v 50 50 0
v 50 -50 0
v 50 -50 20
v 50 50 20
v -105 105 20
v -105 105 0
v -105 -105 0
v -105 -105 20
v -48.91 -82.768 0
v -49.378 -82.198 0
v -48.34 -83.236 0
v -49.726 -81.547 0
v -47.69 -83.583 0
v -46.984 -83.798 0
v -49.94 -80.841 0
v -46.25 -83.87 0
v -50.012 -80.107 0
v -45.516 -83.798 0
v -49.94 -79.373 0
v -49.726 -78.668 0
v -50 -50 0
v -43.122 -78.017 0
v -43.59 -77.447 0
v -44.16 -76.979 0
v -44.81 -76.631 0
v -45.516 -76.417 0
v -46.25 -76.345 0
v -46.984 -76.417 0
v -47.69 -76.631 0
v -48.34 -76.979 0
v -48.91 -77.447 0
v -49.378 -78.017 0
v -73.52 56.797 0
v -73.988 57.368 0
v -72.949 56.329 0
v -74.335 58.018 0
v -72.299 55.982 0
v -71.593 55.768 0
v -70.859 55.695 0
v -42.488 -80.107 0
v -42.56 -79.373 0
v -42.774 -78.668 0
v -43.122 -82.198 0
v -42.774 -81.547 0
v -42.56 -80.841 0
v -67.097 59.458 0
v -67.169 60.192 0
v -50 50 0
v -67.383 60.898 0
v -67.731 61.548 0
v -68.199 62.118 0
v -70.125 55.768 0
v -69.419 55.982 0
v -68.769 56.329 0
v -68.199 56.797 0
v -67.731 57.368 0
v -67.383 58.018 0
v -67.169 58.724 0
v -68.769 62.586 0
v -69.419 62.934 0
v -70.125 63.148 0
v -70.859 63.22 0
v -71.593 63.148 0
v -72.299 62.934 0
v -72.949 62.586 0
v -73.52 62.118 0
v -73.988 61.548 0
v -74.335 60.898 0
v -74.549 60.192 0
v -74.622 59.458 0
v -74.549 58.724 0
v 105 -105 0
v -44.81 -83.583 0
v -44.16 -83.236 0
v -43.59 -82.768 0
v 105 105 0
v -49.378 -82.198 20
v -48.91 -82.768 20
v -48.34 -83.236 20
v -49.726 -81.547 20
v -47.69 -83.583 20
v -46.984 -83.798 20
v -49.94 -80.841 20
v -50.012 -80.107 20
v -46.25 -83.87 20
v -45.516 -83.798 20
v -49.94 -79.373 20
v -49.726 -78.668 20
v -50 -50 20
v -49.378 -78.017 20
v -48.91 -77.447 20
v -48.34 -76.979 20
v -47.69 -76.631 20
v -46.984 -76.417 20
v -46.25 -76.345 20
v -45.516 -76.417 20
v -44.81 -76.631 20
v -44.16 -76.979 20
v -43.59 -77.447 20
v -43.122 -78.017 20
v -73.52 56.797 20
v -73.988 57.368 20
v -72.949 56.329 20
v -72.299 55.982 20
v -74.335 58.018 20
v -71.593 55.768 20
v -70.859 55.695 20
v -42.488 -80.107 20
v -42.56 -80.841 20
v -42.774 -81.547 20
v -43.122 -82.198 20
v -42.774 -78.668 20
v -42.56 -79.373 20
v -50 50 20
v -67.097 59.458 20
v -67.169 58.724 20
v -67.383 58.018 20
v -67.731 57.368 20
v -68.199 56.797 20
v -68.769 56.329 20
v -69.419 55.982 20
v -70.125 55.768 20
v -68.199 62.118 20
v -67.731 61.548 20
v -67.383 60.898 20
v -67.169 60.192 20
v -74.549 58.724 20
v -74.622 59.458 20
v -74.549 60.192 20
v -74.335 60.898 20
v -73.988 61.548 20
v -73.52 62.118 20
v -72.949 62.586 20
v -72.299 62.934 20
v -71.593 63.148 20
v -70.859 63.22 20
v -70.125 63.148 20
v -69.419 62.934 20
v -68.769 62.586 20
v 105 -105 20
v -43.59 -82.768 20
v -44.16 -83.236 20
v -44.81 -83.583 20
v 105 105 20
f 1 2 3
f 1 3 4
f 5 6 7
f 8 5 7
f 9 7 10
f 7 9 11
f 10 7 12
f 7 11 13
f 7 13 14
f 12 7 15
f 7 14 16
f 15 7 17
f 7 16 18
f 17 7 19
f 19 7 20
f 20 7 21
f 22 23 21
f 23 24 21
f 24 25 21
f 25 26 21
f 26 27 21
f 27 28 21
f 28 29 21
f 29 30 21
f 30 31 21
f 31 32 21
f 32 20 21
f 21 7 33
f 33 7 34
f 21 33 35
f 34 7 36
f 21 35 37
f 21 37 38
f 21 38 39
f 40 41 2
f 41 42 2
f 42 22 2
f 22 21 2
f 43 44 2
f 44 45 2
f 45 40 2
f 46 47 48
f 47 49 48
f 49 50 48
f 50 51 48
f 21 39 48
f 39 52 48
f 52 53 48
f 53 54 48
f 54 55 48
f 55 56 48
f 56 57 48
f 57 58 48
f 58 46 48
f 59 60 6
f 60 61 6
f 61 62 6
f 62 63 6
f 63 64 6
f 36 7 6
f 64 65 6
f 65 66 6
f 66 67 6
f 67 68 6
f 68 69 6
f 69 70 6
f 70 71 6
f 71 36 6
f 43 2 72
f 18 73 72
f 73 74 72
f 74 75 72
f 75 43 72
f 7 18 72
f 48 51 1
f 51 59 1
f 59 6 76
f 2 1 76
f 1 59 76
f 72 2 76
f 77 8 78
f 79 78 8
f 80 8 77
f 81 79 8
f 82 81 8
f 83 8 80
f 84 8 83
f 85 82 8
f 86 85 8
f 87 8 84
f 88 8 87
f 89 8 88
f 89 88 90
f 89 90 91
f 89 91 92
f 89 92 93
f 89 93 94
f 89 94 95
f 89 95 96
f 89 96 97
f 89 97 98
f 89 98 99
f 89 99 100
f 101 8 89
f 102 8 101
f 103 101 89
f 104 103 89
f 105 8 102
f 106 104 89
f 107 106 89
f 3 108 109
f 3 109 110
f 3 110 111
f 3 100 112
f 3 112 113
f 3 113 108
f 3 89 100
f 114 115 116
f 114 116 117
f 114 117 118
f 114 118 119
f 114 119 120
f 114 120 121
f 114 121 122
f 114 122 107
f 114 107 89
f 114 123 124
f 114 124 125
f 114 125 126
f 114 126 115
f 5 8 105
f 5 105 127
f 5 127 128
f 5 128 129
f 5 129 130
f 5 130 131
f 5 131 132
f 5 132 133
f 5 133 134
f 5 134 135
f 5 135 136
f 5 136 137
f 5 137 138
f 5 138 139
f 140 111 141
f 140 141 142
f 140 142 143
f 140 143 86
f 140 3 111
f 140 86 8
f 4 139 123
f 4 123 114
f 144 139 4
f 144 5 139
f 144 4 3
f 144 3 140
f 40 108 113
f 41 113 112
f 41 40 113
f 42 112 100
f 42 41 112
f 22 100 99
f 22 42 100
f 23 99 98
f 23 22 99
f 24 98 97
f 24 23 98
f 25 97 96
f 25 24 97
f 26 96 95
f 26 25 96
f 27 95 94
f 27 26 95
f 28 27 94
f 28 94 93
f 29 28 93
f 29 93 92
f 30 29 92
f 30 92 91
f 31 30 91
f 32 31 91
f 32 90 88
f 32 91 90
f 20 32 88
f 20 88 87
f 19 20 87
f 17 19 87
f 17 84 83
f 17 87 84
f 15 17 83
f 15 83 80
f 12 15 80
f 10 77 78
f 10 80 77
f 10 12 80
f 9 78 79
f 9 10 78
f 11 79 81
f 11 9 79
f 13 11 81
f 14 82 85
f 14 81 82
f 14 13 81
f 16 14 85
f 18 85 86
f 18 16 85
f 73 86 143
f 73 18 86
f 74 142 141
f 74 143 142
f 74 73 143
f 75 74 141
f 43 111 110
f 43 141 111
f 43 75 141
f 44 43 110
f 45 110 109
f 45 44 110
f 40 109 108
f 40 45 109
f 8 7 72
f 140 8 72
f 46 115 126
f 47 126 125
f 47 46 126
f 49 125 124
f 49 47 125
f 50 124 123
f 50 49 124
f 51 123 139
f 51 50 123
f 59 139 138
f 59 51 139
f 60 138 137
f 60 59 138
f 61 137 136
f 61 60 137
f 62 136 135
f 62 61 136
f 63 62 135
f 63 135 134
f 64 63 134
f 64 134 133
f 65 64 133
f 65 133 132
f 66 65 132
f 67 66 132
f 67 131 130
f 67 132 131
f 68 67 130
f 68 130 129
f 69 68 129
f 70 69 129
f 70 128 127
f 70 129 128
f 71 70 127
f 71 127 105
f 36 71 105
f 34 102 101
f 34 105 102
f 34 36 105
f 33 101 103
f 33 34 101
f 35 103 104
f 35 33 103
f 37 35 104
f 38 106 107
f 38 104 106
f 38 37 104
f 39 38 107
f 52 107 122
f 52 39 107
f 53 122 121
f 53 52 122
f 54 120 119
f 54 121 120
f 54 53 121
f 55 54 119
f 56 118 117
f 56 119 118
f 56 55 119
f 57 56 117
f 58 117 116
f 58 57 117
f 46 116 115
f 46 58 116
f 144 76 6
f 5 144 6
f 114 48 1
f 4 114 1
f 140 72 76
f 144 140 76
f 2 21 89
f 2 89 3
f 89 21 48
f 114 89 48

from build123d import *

# Parameters (mm, degrees)
F0_W     = 100
F0_H     = 100
F1_DEPTH = 20
F2_R     = 3.7625
F3_DEPTH = 25


with BuildPart() as f1:
    # F0 (on Top) → F1 (new body)
    with BuildSketch(Plane.XY):
        with BuildLine():
            ThreePointArc((46.9041575982, 105), (81.3172798365, 81.3172798365), (105, 46.9041575982))
            Line((105, 46.9041575982), (105, 105))
            Line((105, 105), (46.9041575982, 105))
        make_face()
        with BuildLine():
            ThreePointArc((-105, 46.9041575982), (-81.3172798365, 81.3172798365), (-46.9041575982, 105))
            Line((-46.9041575982, 105), (-105, 105))
            Line((-105, 105), (-105, 46.9041575982))
        make_face()
        with BuildLine():
            Line((-105, -105), (-46.9041575982, -105))
            ThreePointArc((-46.9041575982, -105), (-81.3172798365, -81.3172798365), (-105, -46.9041575982))
            Line((-105, -46.9041575982), (-105, -105))
        make_face()
        with BuildLine():
            Line((105, -105), (105, -46.9041575982))
            ThreePointArc((105, -46.9041575982), (81.3172798365, -81.3172798365), (46.9041575982, -105))
            Line((46.9041575982, -105), (105, -105))
        make_face()
        with BuildLine():
            Line((105, -46.9041575982), (105, 46.9041575982))
            ThreePointArc((105, 46.9041575982), (81.3172798365, 81.3172798365), (46.9041575982, 105))
            Line((46.9041575982, 105), (-46.9041575982, 105))
            ThreePointArc((-46.9041575982, 105), (-81.3172798365, 81.3172798365), (-105, 46.9041575982))
            Line((-105, 46.9041575982), (-105, -46.9041575982))
            ThreePointArc((-105, -46.9041575982), (-81.3172798365, -81.3172798365), (-46.9041575982, -105))
            Line((-46.9041575982, -105), (46.9041575982, -105))
            ThreePointArc((46.9041575982, -105), (81.3172798365, -81.3172798365), (105, -46.9041575982))
        make_face()
        Rectangle(F0_W, F0_H, mode=Mode.SUBTRACT)
    extrude(amount=F1_DEPTH)

    # F2 (on Top) → F3 (cut)
    with BuildSketch(Plane.XY):
        with Locations((-70.8591109885, 59.457853896)):
            Circle(F2_R)
        with Locations((-46.25, -80.1073498501)):
            Circle(F2_R)
    extrude(amount=F3_DEPTH, mode=Mode.SUBTRACT)


solid = f1.part
